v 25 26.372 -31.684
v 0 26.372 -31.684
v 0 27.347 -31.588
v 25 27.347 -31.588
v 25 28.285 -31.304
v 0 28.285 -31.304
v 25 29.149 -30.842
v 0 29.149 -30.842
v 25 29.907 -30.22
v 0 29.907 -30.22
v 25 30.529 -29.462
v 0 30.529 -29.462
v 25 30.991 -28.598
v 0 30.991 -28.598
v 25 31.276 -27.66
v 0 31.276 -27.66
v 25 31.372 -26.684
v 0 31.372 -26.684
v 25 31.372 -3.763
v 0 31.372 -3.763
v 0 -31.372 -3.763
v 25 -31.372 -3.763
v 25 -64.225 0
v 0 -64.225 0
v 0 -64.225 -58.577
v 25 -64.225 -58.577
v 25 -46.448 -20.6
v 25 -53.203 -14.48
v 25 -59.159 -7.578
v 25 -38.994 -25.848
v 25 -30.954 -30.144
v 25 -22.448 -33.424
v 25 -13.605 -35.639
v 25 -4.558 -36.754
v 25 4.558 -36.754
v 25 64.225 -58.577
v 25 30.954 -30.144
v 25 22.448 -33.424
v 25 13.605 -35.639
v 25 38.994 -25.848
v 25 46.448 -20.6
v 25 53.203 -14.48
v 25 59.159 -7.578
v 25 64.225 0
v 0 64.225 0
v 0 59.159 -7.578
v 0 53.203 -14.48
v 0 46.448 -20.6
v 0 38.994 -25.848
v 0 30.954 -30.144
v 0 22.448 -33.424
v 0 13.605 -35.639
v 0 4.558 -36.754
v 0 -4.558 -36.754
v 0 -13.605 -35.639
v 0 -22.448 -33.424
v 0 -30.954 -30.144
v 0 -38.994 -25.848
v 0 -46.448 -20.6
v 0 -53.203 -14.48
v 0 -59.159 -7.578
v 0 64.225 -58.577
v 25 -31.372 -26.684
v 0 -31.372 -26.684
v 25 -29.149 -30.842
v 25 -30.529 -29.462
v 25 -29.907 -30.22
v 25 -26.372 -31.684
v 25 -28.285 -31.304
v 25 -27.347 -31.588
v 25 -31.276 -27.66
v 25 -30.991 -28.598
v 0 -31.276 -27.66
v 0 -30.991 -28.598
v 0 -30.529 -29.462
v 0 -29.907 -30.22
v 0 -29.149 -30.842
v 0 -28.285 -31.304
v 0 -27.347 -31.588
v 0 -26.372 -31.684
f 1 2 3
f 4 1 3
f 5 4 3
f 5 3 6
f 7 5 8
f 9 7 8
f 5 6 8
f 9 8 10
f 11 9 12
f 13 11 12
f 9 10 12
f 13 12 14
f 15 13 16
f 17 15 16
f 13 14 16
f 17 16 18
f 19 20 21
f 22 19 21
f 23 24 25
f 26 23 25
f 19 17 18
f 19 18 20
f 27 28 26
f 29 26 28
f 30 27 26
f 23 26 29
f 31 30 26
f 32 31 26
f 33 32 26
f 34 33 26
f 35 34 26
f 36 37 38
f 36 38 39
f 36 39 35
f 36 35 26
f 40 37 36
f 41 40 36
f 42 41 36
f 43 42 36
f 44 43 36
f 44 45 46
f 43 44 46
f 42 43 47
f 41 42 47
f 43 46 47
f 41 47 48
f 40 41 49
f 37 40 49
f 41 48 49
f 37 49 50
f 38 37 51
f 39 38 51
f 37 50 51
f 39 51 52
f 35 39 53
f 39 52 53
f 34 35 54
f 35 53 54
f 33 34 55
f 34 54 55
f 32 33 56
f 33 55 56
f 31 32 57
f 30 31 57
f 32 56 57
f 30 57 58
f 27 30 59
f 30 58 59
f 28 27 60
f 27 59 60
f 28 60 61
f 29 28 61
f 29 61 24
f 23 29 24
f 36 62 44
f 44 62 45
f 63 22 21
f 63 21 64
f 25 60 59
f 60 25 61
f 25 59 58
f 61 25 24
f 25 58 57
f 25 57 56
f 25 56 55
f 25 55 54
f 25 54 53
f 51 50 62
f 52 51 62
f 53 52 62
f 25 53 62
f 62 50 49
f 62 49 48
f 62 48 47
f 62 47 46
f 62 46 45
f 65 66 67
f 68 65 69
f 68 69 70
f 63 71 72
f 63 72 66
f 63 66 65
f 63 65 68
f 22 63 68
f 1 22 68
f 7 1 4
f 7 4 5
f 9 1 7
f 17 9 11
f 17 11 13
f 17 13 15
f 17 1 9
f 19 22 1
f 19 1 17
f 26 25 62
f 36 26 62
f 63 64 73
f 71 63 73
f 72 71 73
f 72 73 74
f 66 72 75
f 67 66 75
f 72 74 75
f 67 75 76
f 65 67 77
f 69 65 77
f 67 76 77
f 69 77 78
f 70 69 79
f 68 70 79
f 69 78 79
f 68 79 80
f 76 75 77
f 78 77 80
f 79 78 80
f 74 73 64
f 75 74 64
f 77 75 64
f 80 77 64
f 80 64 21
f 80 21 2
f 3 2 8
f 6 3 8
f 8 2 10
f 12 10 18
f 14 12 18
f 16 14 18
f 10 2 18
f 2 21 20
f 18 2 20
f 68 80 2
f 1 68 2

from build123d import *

# Parameters (mm, degrees)
F1_DEPTH = 25
F3_DEPTH = 25


with BuildPart() as f1:
    # F0 (on Right) → F1 (new body)
    with BuildSketch(Plane.YZ):
        with BuildLine():
            ThreePointArc((64.22542, 0), (0, -36.894254), (-64.22542, 0))
            Line((-64.22542, 0), (-64.22542, -58.576524))
            Line((-64.22542, -58.576524), (64.22542, -58.576524))
            Line((64.22542, -58.576524), (64.22542, 0))
        make_face()
    extrude(amount=F1_DEPTH)


with BuildPart() as f3:
    # F2 (on Right) → F3 (new body)
    with BuildSketch(Plane.YZ):
        with BuildLine():
            Line((31.371614, -3.762936), (-31.371614, -3.762936))
            Line((-31.371614, -3.762936), (-31.371614, -26.684324))
            ThreePointArc((-31.371614, -26.684324), (-29.907148, -30.219857), (-26.371614, -31.684324))
            Line((-26.371614, -31.684324), (26.371614, -31.684324))
            ThreePointArc((26.371614, -31.684324), (29.907148, -30.219857), (31.371614, -26.684324))
            Line((31.371614, -26.684324), (31.371614, -3.762936))
        make_face()
    extrude(amount=F3_DEPTH)


solid = Compound([f1.part, f3.part])
